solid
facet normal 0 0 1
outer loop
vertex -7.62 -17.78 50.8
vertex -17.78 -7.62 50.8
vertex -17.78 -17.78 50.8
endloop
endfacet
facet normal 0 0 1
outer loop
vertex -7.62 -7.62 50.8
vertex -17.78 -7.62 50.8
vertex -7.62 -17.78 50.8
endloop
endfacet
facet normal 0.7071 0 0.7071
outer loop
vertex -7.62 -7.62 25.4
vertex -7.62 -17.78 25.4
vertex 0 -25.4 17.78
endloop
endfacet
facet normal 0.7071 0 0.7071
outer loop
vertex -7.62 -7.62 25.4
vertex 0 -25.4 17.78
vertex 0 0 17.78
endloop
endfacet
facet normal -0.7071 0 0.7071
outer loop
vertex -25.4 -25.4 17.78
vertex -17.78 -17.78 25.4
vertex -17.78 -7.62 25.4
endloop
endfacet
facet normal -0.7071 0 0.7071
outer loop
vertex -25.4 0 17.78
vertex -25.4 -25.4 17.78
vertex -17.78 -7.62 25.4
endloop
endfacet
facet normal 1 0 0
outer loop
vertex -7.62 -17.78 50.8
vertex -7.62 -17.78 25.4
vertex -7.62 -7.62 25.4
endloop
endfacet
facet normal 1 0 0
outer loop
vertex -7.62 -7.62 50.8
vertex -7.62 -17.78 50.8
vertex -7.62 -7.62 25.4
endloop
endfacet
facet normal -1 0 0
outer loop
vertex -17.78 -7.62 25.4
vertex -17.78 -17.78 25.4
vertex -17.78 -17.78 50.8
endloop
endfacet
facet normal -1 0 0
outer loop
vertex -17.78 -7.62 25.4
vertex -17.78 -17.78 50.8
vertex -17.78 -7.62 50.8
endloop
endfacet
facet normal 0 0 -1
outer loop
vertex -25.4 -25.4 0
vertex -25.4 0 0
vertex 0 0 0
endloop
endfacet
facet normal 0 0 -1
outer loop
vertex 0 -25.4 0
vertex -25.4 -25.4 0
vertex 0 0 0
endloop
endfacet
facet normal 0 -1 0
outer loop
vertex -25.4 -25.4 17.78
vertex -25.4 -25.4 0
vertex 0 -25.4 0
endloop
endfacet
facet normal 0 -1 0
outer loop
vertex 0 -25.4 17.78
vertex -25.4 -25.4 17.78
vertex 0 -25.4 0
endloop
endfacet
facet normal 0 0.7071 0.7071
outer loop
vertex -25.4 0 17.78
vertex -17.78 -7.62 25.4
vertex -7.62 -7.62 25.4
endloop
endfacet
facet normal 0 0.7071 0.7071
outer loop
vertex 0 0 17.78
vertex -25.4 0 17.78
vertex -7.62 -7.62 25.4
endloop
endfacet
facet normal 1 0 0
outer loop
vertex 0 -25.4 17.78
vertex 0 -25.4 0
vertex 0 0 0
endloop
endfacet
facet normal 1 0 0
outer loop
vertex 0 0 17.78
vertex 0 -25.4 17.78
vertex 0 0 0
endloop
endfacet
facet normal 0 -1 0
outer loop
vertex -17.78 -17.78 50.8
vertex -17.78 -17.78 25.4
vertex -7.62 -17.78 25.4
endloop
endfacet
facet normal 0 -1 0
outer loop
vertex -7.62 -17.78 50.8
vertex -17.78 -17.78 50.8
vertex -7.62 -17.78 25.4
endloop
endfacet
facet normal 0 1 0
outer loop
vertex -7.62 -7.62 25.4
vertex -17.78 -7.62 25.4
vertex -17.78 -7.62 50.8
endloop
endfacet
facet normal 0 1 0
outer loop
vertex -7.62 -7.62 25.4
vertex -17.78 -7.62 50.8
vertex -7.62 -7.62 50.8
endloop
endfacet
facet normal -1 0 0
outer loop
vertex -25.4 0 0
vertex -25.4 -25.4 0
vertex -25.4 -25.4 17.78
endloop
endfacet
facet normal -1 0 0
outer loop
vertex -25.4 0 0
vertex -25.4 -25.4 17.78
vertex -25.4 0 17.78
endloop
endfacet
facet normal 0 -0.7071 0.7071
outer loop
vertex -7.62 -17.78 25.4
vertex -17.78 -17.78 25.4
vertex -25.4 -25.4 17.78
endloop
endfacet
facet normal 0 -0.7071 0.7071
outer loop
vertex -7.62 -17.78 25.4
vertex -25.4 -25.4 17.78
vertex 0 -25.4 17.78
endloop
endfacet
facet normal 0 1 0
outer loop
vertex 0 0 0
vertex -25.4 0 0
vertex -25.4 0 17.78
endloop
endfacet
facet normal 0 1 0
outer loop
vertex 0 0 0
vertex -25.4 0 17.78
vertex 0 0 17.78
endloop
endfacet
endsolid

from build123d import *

# Parameters (mm, degrees)
F0_W     = 25.4
F0_H     = 25.4
F1_DEPTH = 25.4
F2_SIZE  = 7.62
F3_W     = 10.16
F3_H     = 10.16
F4_DEPTH = 25.4


with BuildPart() as f1:
    # F0 (on Top) → F1 (new body)
    with BuildSketch(Plane.XY):
        with Locations((-12.7, -12.7)):
            Rectangle(F0_W, F0_H)
    extrude(amount=F1_DEPTH)

    # F2
    f2_edges = [f1.edges().sort_by_distance(p)[0] for p in [
        (-12.7, -25.4, 25.4),
        (-25.4, -12.7, 25.4),
        (-12.7, 0, 25.4),
        (0, -12.7, 25.4),
    ]]
    chamfer(f2_edges, length=F2_SIZE)

    # F3 (on face) → F4 (join)
    with BuildSketch(Plane.XY.offset(25.4)):
        with Locations((-12.7, -12.7)):
            Rectangle(F3_W, F3_H)
    extrude(amount=F4_DEPTH)


solid = f1.part
